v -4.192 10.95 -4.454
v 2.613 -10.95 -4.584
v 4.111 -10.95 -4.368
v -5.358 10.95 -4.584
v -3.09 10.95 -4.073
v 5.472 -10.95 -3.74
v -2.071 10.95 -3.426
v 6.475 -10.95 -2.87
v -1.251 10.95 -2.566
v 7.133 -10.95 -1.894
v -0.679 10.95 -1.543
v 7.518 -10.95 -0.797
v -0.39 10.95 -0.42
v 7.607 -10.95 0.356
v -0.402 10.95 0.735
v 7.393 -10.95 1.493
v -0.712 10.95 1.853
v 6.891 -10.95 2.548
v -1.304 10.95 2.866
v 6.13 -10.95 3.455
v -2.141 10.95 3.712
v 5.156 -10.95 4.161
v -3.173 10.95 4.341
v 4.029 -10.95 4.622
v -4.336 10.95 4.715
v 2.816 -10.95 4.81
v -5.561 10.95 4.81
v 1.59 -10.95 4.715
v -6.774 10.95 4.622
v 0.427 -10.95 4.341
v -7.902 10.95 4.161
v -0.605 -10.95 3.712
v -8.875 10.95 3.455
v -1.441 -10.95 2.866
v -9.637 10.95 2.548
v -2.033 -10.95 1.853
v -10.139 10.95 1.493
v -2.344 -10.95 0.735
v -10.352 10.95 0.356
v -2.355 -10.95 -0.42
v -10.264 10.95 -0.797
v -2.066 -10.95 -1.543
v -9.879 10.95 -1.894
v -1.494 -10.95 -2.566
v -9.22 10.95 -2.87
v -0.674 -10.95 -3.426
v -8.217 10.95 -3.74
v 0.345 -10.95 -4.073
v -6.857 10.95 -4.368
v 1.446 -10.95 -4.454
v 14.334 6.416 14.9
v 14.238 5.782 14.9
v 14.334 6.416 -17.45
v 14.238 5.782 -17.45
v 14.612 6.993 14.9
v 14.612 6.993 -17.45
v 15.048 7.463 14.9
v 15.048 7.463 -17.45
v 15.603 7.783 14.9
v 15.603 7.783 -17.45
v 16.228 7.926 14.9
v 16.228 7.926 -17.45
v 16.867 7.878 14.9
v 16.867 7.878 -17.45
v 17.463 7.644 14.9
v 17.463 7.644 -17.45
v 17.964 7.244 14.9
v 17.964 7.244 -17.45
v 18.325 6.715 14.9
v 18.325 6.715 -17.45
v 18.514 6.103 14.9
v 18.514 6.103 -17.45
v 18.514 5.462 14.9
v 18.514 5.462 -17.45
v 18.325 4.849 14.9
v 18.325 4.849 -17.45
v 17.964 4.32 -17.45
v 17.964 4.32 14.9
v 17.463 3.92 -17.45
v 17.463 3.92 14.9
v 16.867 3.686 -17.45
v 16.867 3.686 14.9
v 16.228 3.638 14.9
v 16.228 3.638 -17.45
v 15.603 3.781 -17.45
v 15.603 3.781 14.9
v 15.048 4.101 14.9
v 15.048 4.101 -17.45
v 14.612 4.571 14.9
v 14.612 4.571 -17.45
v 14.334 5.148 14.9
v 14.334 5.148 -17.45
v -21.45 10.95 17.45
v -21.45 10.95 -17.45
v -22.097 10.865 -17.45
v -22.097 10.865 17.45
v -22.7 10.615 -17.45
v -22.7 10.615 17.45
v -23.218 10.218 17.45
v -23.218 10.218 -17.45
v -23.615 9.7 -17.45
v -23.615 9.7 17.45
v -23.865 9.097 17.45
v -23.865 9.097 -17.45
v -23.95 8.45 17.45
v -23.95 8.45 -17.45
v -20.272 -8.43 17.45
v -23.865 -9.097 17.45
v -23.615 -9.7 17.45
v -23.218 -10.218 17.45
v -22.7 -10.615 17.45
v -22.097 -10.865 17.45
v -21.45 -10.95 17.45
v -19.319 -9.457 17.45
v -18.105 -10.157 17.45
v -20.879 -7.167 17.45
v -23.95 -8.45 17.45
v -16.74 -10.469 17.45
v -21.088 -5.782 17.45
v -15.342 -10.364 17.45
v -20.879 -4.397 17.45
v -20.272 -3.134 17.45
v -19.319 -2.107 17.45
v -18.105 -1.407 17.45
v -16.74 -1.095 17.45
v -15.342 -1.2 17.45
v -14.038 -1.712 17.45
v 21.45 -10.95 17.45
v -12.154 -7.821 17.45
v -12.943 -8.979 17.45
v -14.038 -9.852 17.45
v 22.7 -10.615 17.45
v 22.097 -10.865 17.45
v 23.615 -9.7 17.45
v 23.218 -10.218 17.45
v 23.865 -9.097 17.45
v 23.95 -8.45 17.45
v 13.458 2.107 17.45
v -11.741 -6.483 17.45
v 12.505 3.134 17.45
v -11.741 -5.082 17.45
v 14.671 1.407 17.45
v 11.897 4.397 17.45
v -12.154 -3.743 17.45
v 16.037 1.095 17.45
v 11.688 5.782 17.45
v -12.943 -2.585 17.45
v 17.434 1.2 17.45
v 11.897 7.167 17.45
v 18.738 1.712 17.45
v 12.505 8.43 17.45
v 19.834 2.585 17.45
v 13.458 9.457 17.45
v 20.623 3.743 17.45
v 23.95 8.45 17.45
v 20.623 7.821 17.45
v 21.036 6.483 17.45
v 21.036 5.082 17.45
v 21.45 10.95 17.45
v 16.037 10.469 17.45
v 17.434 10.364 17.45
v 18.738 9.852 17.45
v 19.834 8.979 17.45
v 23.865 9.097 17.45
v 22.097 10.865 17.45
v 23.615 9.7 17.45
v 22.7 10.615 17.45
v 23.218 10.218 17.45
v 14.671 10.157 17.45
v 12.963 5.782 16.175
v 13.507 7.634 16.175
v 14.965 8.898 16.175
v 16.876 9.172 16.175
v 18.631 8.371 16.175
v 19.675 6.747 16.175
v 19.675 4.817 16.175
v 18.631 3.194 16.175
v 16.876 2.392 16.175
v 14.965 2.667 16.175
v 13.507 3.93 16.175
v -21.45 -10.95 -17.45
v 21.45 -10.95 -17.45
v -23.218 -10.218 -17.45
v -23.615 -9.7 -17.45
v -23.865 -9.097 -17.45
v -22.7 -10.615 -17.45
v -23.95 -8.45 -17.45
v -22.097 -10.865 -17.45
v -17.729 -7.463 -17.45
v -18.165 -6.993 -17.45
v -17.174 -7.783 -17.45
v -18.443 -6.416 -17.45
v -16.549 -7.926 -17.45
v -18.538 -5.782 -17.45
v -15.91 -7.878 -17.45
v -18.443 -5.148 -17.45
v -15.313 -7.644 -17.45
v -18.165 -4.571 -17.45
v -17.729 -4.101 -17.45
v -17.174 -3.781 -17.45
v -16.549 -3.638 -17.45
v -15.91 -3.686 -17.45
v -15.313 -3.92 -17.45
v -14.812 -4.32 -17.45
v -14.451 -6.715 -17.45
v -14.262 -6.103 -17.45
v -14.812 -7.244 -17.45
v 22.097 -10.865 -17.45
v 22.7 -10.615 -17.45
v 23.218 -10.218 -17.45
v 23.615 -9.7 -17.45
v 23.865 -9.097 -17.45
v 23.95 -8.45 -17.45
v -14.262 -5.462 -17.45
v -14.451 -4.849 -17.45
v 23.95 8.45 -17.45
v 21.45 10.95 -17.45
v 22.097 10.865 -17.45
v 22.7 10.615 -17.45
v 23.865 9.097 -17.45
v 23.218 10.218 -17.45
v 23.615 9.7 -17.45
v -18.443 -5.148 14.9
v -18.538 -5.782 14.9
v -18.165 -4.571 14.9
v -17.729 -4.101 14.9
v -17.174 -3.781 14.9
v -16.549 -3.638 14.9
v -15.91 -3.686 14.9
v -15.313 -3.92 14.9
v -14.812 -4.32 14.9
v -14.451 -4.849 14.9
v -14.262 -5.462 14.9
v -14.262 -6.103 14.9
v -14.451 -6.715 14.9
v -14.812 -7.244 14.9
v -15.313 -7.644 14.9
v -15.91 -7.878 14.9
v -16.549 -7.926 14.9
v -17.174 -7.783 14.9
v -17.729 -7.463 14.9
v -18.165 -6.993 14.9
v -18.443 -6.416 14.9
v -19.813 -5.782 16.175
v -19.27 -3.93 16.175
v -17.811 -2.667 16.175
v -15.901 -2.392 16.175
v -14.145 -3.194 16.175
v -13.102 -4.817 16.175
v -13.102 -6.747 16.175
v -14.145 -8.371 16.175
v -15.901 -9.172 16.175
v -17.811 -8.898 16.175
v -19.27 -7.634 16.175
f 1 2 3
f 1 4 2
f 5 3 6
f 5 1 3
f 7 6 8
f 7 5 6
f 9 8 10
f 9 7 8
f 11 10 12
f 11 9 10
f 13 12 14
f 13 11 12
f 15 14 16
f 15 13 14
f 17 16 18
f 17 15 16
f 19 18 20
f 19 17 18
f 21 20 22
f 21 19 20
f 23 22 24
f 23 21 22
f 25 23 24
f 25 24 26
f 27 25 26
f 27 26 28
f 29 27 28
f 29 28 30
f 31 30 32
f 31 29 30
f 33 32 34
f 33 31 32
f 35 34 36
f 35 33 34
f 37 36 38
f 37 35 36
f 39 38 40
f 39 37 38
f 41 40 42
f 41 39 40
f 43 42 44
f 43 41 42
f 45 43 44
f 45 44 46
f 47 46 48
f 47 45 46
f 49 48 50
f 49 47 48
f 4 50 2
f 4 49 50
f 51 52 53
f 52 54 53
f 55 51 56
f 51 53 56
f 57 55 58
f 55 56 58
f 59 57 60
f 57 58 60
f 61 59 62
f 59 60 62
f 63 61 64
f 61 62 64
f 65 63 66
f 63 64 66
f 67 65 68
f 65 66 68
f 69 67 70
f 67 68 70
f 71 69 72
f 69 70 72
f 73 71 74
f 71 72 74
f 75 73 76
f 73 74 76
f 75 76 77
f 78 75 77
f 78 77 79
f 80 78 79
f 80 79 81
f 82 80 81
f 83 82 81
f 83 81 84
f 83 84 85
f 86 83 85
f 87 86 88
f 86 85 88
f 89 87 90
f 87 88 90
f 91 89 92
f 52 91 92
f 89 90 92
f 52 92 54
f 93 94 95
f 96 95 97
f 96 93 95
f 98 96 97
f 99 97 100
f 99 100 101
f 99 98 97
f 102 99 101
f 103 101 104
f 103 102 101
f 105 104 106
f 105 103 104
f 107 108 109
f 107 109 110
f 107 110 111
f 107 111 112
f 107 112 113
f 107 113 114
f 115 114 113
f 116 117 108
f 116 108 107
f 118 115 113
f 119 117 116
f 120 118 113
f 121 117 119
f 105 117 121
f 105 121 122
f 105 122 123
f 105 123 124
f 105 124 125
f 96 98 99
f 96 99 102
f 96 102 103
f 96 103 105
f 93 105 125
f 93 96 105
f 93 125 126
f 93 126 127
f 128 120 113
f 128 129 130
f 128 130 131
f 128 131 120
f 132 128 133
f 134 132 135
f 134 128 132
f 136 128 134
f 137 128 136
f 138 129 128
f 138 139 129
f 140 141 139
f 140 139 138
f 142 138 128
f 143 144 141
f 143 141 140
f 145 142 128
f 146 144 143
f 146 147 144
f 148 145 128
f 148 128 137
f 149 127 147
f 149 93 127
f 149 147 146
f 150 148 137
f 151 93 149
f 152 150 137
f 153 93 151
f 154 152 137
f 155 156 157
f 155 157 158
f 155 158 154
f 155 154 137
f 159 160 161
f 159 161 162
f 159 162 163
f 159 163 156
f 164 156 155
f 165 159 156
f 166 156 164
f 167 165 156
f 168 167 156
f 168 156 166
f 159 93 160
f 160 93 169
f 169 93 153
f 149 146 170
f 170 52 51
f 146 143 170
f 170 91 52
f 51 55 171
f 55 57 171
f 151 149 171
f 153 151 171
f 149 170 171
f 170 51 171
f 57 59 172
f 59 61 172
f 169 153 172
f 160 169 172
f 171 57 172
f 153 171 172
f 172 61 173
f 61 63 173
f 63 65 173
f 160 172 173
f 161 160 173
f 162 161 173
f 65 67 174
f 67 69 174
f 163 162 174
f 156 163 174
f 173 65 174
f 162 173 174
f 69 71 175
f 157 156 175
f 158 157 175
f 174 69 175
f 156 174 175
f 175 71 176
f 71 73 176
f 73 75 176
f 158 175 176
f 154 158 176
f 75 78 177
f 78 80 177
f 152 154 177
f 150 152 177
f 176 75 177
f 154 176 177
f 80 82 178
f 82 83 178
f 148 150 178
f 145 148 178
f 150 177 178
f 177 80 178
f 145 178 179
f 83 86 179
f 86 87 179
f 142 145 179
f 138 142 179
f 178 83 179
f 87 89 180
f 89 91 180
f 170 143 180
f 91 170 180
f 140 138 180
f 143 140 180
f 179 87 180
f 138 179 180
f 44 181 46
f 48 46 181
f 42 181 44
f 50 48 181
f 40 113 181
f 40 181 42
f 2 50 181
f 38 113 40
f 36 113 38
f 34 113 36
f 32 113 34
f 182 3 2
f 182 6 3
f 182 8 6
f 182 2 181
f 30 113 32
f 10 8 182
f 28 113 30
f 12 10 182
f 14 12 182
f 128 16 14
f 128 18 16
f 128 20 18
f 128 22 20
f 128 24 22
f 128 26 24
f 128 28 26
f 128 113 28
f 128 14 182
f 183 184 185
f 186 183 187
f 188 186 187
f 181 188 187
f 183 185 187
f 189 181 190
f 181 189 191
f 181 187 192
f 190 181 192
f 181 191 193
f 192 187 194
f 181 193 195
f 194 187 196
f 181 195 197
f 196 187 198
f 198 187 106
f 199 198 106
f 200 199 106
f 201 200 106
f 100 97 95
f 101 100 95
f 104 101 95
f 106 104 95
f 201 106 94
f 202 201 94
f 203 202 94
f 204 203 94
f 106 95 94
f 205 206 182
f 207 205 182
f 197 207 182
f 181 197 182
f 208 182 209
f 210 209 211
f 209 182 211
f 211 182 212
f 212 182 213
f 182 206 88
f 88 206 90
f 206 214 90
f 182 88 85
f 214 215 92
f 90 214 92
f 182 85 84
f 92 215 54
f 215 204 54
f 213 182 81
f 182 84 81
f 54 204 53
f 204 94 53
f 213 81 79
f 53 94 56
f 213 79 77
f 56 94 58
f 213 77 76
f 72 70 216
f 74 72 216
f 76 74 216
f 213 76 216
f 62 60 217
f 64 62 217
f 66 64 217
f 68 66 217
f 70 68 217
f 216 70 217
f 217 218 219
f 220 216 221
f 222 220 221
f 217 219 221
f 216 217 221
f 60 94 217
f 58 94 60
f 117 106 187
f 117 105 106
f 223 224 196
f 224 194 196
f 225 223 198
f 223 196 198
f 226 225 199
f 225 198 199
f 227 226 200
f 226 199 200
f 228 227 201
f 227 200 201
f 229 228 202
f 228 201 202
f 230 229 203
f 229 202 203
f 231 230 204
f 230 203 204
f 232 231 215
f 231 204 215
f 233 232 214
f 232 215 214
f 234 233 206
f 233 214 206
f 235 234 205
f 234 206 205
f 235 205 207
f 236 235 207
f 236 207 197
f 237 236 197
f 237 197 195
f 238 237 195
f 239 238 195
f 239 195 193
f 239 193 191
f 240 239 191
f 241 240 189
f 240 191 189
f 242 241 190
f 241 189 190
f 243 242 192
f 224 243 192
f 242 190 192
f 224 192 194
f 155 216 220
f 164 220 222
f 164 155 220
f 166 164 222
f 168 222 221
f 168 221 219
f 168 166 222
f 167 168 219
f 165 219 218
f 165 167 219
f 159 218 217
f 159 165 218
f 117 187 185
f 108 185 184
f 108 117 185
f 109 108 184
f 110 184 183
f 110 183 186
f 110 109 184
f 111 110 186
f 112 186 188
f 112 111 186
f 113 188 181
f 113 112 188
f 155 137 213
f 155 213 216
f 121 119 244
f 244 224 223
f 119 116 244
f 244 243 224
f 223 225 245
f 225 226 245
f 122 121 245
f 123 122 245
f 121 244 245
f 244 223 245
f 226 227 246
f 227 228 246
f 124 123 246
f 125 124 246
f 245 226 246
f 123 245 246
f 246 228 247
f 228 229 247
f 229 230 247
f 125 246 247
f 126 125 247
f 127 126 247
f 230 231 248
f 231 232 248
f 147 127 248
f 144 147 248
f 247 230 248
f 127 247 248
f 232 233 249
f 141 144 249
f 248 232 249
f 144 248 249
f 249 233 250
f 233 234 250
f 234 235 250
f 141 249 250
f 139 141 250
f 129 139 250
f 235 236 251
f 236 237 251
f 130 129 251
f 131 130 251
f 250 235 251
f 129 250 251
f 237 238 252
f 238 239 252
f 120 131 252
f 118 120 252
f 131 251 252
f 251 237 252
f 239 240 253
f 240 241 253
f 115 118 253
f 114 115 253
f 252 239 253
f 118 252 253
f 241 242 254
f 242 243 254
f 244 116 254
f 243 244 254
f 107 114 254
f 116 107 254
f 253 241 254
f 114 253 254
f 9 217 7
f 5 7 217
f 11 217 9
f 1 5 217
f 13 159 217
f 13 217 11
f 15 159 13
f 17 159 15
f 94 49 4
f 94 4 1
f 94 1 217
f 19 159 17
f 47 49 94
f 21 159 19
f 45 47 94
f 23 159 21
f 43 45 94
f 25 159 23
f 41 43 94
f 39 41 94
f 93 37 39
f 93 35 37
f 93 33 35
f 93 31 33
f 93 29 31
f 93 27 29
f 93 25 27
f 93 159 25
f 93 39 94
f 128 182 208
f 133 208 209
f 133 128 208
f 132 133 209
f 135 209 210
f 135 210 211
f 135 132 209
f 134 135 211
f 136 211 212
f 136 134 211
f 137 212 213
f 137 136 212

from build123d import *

# Parameters (mm, degrees)
BOSS_EXTRUDE1_DEPTH                             = 17.45
CSK_FOR_M4_FLAT_HEAD_MACHINE_SCREW1_D           = 4.3
CSK_FOR_M4_FLAT_HEAD_MACHINE_SCREW1_CSINK_D     = 9.4
CSK_FOR_M4_FLAT_HEAD_MACHINE_SCREW1_CSINK_ANGLE = 90
SKETCH24_W                                      = 4.699
SKETCH24_H                                      = 41.40401941


with BuildPart() as part:
    # Sketch1 → Boss-Extrude1 (new body, symmetric)
    with BuildSketch(Plane.XY):
        with BuildLine():
            Line((-21.45, -10.95), (21.45, -10.95))
            ThreePointArc((21.45, -10.95), (23.217766953, -10.217766953), (23.95, -8.45))
            Line((23.95, -8.45), (23.95, 8.45))
            ThreePointArc((23.95, 8.45), (23.217766953, 10.217766953), (21.45, 10.95))
            Line((21.45, 10.95), (-21.45, 10.95))
            ThreePointArc((-21.45, 10.95), (-23.217766953, 10.217766953), (-23.95, 8.45))
            Line((-23.95, 8.45), (-23.95, -8.45))
            ThreePointArc((-23.95, -8.45), (-23.217766953, -10.217766953), (-21.45, -10.95))
        make_face()
    extrude(amount=BOSS_EXTRUDE1_DEPTH, both=True)

    # CSK for M4 Flat Head Machine Screw1 (through all)
    with Locations(Plane.XY.offset(17.45)):
        with Locations((-16.388274302, -5.782084253), (16.388274302, 5.782084253)):
            CounterSinkHole(CSK_FOR_M4_FLAT_HEAD_MACHINE_SCREW1_D / 2, CSK_FOR_M4_FLAT_HEAD_MACHINE_SCREW1_CSINK_D / 2, counter_sink_angle=CSK_FOR_M4_FLAT_HEAD_MACHINE_SCREW1_CSINK_ANGLE)

    # Sketch24 → Hosel Diameter (revolve, cut)
    with BuildSketch(Plane(origin=(-1.212269458, -0.441229999, 0), x_dir=(0, 0, -1), z_dir=(0.939692621, 0.342020143, 0))):
        with Locations((2.2345, -1.146750947)):
            Rectangle(SKETCH24_W, SKETCH24_H)
    revolve(axis=Axis((-7.900561861, 17.934702354, 0.115), (0.342020143, -0.939692621, 0)), mode=Mode.SUBTRACT)


solid = part.part
